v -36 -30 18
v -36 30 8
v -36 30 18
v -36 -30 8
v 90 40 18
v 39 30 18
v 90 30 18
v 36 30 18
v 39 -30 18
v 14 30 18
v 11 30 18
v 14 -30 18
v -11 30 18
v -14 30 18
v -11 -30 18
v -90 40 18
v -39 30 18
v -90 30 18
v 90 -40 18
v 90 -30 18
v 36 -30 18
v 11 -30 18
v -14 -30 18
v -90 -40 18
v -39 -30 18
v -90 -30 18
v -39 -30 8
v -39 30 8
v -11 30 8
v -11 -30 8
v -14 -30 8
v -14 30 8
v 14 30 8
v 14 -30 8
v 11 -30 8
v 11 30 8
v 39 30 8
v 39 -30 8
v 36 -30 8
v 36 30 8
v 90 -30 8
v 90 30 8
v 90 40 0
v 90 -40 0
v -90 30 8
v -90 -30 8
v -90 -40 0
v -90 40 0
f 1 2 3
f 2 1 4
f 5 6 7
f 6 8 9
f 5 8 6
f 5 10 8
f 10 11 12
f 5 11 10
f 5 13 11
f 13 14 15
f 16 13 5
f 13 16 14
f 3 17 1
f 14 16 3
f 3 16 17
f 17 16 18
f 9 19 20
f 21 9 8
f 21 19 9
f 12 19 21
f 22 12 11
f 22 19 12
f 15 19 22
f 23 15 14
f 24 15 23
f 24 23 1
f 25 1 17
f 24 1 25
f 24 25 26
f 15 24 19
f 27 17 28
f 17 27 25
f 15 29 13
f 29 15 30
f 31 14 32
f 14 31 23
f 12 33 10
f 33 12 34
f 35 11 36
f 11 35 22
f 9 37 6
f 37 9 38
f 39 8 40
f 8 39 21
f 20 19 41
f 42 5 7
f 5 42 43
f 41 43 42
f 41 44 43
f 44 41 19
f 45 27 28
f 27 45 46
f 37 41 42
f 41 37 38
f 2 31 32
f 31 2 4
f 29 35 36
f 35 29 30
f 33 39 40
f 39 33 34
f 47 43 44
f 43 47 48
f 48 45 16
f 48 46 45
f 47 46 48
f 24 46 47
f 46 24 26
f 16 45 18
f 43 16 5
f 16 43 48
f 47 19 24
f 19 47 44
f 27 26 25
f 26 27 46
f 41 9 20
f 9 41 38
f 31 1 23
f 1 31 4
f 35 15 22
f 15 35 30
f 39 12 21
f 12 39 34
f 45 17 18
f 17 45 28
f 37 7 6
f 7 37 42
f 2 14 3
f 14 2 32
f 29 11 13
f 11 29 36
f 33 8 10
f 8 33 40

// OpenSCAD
$fn = 32;

// ----------------------------------------------------------------------
// Rib frame 180 x 80 x 18
// 4 ribs at 25 mm pitch
// ----------------------------------------------------------------------

// --- parameters (mm) ---
frame = [180, 80, 8];  // base plate size (x, y, z)
rail_w = 10;           // side rail width
ribs = 4;              // number of ribs
rib_t = 3;             // rib thickness
rib_h = 10;            // rib height above the base plate
pitch = 25;            // pitch between rib centres

// --- derived feature positions (mm) ---
span = (ribs - 1) * pitch;          // = 75   distance between the outer ribs
origin_x = -span / 2;               // = -37.5   X of the first rib
rib_len = frame[1] - 2 * rail_w + 2;  // = 62   rib length, 1 mm into each rail
feature_centers = [
  [origin_x + 0 * pitch, 0],
  [origin_x + 1 * pitch, 0],
  [origin_x + 2 * pitch, 0],
  [origin_x + 3 * pitch, 0]
];   // rib centre line, drives the rib loop

// base plate, two side rails, then the ribs read straight off feature_centers
union() {
  translate([-frame[0] / 2, -frame[1] / 2, 0]) cube(frame);
  translate([-frame[0] / 2, -frame[1] / 2, 0]) cube([frame[0], rail_w, frame[2] + rib_h]);
  translate([-frame[0] / 2, frame[1] / 2 - rail_w, 0]) cube([frame[0], rail_w, frame[2] + rib_h]);
  for (centre = feature_centers)
    translate([centre[0] - rib_t / 2, centre[1] - rib_len / 2, frame[2] - 1])
      cube([rib_t, rib_len, rib_h + 1]);
}
